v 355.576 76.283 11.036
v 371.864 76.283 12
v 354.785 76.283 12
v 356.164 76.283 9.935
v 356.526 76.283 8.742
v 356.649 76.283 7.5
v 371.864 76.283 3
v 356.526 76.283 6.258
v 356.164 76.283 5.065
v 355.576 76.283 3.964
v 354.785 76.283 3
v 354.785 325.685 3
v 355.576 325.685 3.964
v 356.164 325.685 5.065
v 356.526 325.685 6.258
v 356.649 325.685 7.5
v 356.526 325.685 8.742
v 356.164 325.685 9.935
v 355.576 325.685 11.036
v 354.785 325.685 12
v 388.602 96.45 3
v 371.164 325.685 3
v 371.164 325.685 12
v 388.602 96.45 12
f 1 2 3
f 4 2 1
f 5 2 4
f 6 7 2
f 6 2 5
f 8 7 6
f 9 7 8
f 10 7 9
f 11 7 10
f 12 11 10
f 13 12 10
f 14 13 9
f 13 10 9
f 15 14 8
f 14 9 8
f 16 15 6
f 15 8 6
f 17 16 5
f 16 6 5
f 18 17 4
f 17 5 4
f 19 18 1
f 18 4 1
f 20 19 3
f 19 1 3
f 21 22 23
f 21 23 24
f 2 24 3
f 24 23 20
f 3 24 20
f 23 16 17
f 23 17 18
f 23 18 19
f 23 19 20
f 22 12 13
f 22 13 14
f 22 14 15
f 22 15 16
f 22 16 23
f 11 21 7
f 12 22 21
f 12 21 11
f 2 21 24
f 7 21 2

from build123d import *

# Parameters (mm, degrees)
BOSS_EXTRUDE1_DEPTH     = 15
SCALE1_SCALE            = 0.6
CUT_EXTRUDE2_DEPTH      = 414.628802078
CUT_EXTRUDE2_DEPTH_BACK = 414.628802078


with BuildPart() as part:
    # Sketch3 → Boss-Extrude1 (new body)
    with BuildSketch(Plane.XY):
        Polygon((373.374123275, 416.968077367), (402.437373481, 34.910153282), (374.539751445, 1.298077367), (346.074948764, 1.298077367), (346.074948764, 416.968077367), align=None)
    extrude(amount=BOSS_EXTRUDE1_DEPTH)


with BuildPart() as part_1:
    # Scale1: scaled about (367.849283485, 188.760033588, 7.5)
    add(part.part.scale(SCALE1_SCALE).moved(Location((147.139713394, 75.504013435, 3))))

    # Sketch9 → Cut-Extrude2 (cut, two sides: drawn at the far end of the back side and taken through both)
    with BuildSketch(Plane(origin=(0, 184.5, 0), x_dir=(1, 0, 0), z_dir=(0, 1, 0)).offset(-CUT_EXTRUDE2_DEPTH_BACK)):
        with BuildLine():
            Line((354.784682653, -12), (354.784682653, -3))
            ThreePointArc((354.784682653, -3), (356.648643683, -7.5), (354.784682653, -12))
        make_face()
    extrude(amount=CUT_EXTRUDE2_DEPTH + CUT_EXTRUDE2_DEPTH_BACK, mode=Mode.SUBTRACT)


solid = part_1.part
